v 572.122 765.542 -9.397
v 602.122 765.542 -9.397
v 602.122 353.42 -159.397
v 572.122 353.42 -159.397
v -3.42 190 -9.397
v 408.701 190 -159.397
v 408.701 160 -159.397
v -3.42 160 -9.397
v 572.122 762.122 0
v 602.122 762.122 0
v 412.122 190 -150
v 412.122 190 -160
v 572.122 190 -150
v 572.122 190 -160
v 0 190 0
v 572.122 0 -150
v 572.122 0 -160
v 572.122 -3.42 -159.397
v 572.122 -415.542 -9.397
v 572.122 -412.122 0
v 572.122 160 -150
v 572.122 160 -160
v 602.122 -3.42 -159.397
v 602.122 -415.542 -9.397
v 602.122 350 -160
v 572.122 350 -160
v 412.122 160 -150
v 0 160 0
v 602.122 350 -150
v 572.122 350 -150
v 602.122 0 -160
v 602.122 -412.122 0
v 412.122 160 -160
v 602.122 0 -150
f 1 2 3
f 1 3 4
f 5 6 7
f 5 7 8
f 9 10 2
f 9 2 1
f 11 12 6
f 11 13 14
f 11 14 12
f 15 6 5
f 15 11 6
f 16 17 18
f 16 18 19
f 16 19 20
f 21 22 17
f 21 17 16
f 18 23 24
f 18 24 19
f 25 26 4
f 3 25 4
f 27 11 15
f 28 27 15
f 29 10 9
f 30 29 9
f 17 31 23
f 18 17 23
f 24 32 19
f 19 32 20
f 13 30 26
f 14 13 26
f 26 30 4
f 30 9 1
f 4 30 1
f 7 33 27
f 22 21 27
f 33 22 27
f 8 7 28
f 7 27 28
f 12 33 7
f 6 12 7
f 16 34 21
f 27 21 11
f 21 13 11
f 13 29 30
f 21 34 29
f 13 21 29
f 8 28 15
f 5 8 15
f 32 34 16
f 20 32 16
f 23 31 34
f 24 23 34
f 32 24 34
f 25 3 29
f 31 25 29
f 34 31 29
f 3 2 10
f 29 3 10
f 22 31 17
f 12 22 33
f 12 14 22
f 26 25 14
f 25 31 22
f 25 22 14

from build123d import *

# Parameters (mm, degrees)
BOSS_EXTRUDE1_DEPTH  = 350
SKETCH2_W            = 150
SKETCH2_H            = 350
BOSS_EXTRUDE2_DEPTH  = 350
BOSS_EXTRUDE3_DEPTH  = 350
BOSS_EXTRUDE4_DEPTH  = 350
SKETCH6_W            = 438.570660024
SKETCH6_H            = 30
CUT_EXTRUDE1_DEPTH   = 10
CUT_EXTRUDE2_DEPTH   = 10
SKETCH8_W            = 30
SKETCH8_H            = 438.570660025
CUT_EXTRUDE3_DEPTH   = 10
SKETCH9_W            = 30
SKETCH9_H            = 438.570660025
CUT_EXTRUDE4_DEPTH   = 10
SKETCH12_W           = 438.570660024
SKETCH12_H           = 30
BOSS_EXTRUDE5_DEPTH  = 10
BOSS_EXTRUDE6_DEPTH  = 10
SKETCH14_W           = 30
SKETCH14_H           = 438.570660025
BOSS_EXTRUDE7_DEPTH  = 10
SKETCH15_W           = 30
SKETCH15_H           = 438.570660025
BOSS_EXTRUDE8_DEPTH  = 10
BOSS_EXTRUDE10_DEPTH = 30
BOSS_EXTRUDE11_DEPTH = 30
BOSS_EXTRUDE12_DEPTH = 30
SKETCH20_W           = 438.570660024
SKETCH20_H           = 160
CUT_EXTRUDE5_DEPTH   = 1000
SKETCH21_W           = 438.570660024
SKETCH21_H           = 160
CUT_EXTRUDE6_DEPTH   = 1000
SKETCH22_W           = 160
SKETCH22_H           = 160
CUT_EXTRUDE7_DEPTH   = 1000
SKETCH23_W           = 160
SKETCH23_H           = 160
CUT_EXTRUDE8_DEPTH   = 1000
SKETCH24_W           = 160
SKETCH24_H           = 438.570660025
CUT_EXTRUDE9_DEPTH   = 1000
SKETCH25_W           = 160
SKETCH25_H           = 438.570660025
CUT_EXTRUDE10_DEPTH  = 1000
SKETCH26_W           = 160
SKETCH26_H           = 350
CUT_EXTRUDE11_DEPTH  = 1000
SKETCH27_W           = 160
SKETCH27_H           = 438.570660025
CUT_EXTRUDE12_DEPTH  = 1000
SKETCH28_W           = 160
SKETCH28_H           = 438.570660025
CUT_EXTRUDE13_DEPTH  = 1000
CUT_EXTRUDE14_DEPTH  = 1000
CUT_EXTRUDE15_DEPTH  = 1000


with BuildPart() as part:
    # Sketch1 → Boss-Extrude1 (new body)
    with BuildSketch(Plane(origin=(0, 0, 0), x_dir=(1, 0, 0), z_dir=(0, 1, 0))):
        Polygon((0, 0), (412.121612918, 0), (412.121612918, 150), align=None)
    extrude(amount=BOSS_EXTRUDE1_DEPTH)

    # Sketch2 → Boss-Extrude2 (add)
    with BuildSketch(Plane(origin=(412.121612918, 0, 0), x_dir=(0, 0, -1), z_dir=(1, 0, 0))):
        with Locations((75, 175)):
            Rectangle(SKETCH2_W, SKETCH2_H)
    extrude(amount=BOSS_EXTRUDE2_DEPTH)

    # Sketch4 → Boss-Extrude3 (add)
    with BuildSketch(Plane(origin=(762.121612918, 0, 0), x_dir=(0, 0, -1), z_dir=(1, 0, 0))):
        Polygon((0, 762.121612918), (150, 350), (0, 350), align=None)
    extrude(amount=-BOSS_EXTRUDE3_DEPTH)

    # Sketch5 → Boss-Extrude4 (add)
    with BuildSketch(Plane(origin=(762.121612918, 0, 0), x_dir=(0, 0, -1), z_dir=(1, 0, 0))):
        Polygon((0, 0), (0, -412.121612918), (150, 0), align=None)
    extrude(amount=-BOSS_EXTRUDE4_DEPTH)

    # Sketch6 → Cut-Extrude1 (cut)
    with BuildSketch(Plane(origin=(0, 0, 0), x_dir=(-0.9396926207859104, 0, 0.34202014332566316), z_dir=(-0.34202014332566316, 0, -0.9396926207859104))):
        with Locations((-219.285330012, 175)):
            Rectangle(SKETCH6_W, SKETCH6_H)
    extrude(amount=-CUT_EXTRUDE1_DEPTH, mode=Mode.SUBTRACT)

    # Sketch7 → Cut-Extrude2 (cut)
    with BuildSketch(Plane(origin=(0, 0, -150), x_dir=(-1, 0, 0), z_dir=(0, 0, -1))):
        Polygon((-412.121612918, 190), (-572.121612918, 190), (-572.121612918, 350), (-602.121612918, 350), (-602.121612918, 190), (-602.121612918, 164.900861359), (-602.121612918, 160), (-602.121612918, 0), (-572.121612918, 0), (-572.121612918, 160), (-412.121612918, 160), align=None)
    extrude(amount=-CUT_EXTRUDE2_DEPTH, mode=Mode.SUBTRACT)

    # Sketch8 → Cut-Extrude3 (cut)
    with BuildSketch(Plane(origin=(0, -48.209070726, -132.453333234), x_dir=(-1, 0, 0), z_dir=(0, -0.34202014332566283, -0.9396926207859106))):
        with Locations((-587.121612918, -167.982308514)):
            Rectangle(SKETCH8_W, SKETCH8_H)
    extrude(amount=-CUT_EXTRUDE3_DEPTH, mode=Mode.SUBTRACT)

    # Sketch9 → Cut-Extrude4 (cut)
    with BuildSketch(Plane(origin=(0, 89.151293181, -244.941164929), x_dir=(-1, 0, 0), z_dir=(0, 0.342020143325663, -0.9396926207859105))):
        with Locations((-587.121612918, 496.874725788)):
            Rectangle(SKETCH9_W, SKETCH9_H)
    extrude(amount=-CUT_EXTRUDE4_DEPTH, mode=Mode.SUBTRACT)

    # Sketch20 → Cut-Extrude5 (cut)
    with BuildSketch(Plane(origin=(0, 0, 0), x_dir=(-0.9396926207859104, 0, 0.34202014332566316), z_dir=(-0.34202014332566316, 0, -0.9396926207859104))):
        with Locations((-219.285330012, 80)):
            Rectangle(SKETCH20_W, SKETCH20_H)
    extrude(amount=-CUT_EXTRUDE5_DEPTH, mode=Mode.SUBTRACT)

    # Sketch21 → Cut-Extrude6 (cut)
    with BuildSketch(Plane(origin=(0, 0, 0), x_dir=(-0.9396926207859104, 0, 0.34202014332566316), z_dir=(-0.34202014332566316, 0, -0.9396926207859104))):
        with Locations((-219.285330012, 270)):
            Rectangle(SKETCH21_W, SKETCH21_H)
    extrude(amount=-CUT_EXTRUDE6_DEPTH, mode=Mode.SUBTRACT)

    # Sketch22 → Cut-Extrude7 (cut)
    with BuildSketch(Plane(origin=(0, 0, -150), x_dir=(-1, 0, 0), z_dir=(0, 0, -1))):
        with Locations((-492.121612918, 270)):
            Rectangle(SKETCH22_W, SKETCH22_H)
    extrude(amount=-CUT_EXTRUDE7_DEPTH, mode=Mode.SUBTRACT)

    # Sketch23 → Cut-Extrude8 (cut)
    with BuildSketch(Plane(origin=(0, 0, -150), x_dir=(-1, 0, 0), z_dir=(0, 0, -1))):
        with Locations((-492.121612918, 80)):
            Rectangle(SKETCH23_W, SKETCH23_H)
    extrude(amount=-CUT_EXTRUDE8_DEPTH, mode=Mode.SUBTRACT)

    # Sketch24 → Cut-Extrude9 (cut)
    with BuildSketch(Plane(origin=(0, -48.209070726, -132.453333234), x_dir=(-1, 0, 0), z_dir=(0, -0.34202014332566283, -0.9396926207859106))):
        with Locations((-492.121612918, -167.982308514)):
            Rectangle(SKETCH24_W, SKETCH24_H)
    extrude(amount=-CUT_EXTRUDE9_DEPTH, mode=Mode.SUBTRACT)

    # Sketch25 → Cut-Extrude10 (cut)
    with BuildSketch(Plane(origin=(0, -48.209070726, -132.453333234), x_dir=(-1, 0, 0), z_dir=(0, -0.34202014332566283, -0.9396926207859106))):
        with Locations((-682.121612918, -167.982308514)):
            Rectangle(SKETCH25_W, SKETCH25_H)
    extrude(amount=-CUT_EXTRUDE10_DEPTH, mode=Mode.SUBTRACT)

    # Sketch26 → Cut-Extrude11 (cut)
    with BuildSketch(Plane(origin=(0, 0, -150), x_dir=(-1, 0, 0), z_dir=(0, 0, -1))):
        with Locations((-682.121612918, 175)):
            Rectangle(SKETCH26_W, SKETCH26_H)
    extrude(amount=-CUT_EXTRUDE11_DEPTH, mode=Mode.SUBTRACT)

    # Sketch27 → Cut-Extrude12 (cut)
    with BuildSketch(Plane(origin=(0, 89.151293181, -244.941164929), x_dir=(-1, 0, 0), z_dir=(0, 0.342020143325663, -0.9396926207859105))):
        with Locations((-682.121612918, 496.874725788)):
            Rectangle(SKETCH27_W, SKETCH27_H)
    extrude(amount=-CUT_EXTRUDE12_DEPTH, mode=Mode.SUBTRACT)

    # Sketch28 → Cut-Extrude13 (cut)
    with BuildSketch(Plane(origin=(0, 89.151293181, -244.941164929), x_dir=(-1, 0, 0), z_dir=(0, 0.342020143325663, -0.9396926207859105))):
        with Locations((-492.121612918, 496.874725788)):
            Rectangle(SKETCH28_W, SKETCH28_H)
    extrude(amount=-CUT_EXTRUDE13_DEPTH, mode=Mode.SUBTRACT)

    # Sketch29 → Cut-Extrude14 (cut)
    with BuildSketch(Plane.XZ.offset(-160)):
        Polygon((572.121612918, 0), (29.238044002, 0), (413.884882725, -140), (572.121612918, -140), align=None)
    extrude(amount=-CUT_EXTRUDE14_DEPTH, mode=Mode.SUBTRACT)

    # Sketch30 → Cut-Extrude15 (cut)
    with BuildSketch(Plane.ZY.offset(-572.121612918)):
        Polygon((-140, 348.236730193), (-140, 1.763269807), (0, -382.883568917), (0, 732.883568917), align=None)
    extrude(amount=-CUT_EXTRUDE15_DEPTH, mode=Mode.SUBTRACT)


with BuildPart() as body_2:
    # Sketch12 → Boss-Extrude5 (new body)
    with BuildSketch(Plane(origin=(0, 0, 0), x_dir=(-0.9396926207859104, 0, 0.34202014332566316), z_dir=(-0.34202014332566316, 0, -0.9396926207859104))):
        with Locations((-219.285330012, 175)):
            Rectangle(SKETCH12_W, SKETCH12_H)
    extrude(amount=BOSS_EXTRUDE5_DEPTH)



with BuildPart() as body_3:
    # Sketch13 → Boss-Extrude6 (new body)
    with BuildSketch(Plane(origin=(0, 0, -150), x_dir=(-1, 0, 0), z_dir=(0, 0, -1))):
        Polygon((-572.121612918, 0), (-572.121612918, 160), (-412.121612918, 160), (-412.121612918, 190), (-572.121612918, 190), (-572.121612918, 350), (-602.121612918, 350), (-602.121612918, 0), align=None)
    extrude(amount=BOSS_EXTRUDE6_DEPTH)



with BuildPart() as body_4:
    # Sketch14 → Boss-Extrude7 (new body)
    with BuildSketch(Plane(origin=(0, -48.209070726, -132.453333234), x_dir=(-1, 0, 0), z_dir=(0, -0.34202014332566283, -0.9396926207859106))):
        with Locations((-587.121612918, -167.982308514)):
            Rectangle(SKETCH14_W, SKETCH14_H)
    extrude(amount=BOSS_EXTRUDE7_DEPTH)



with BuildPart() as body_5:
    # Sketch15 → Boss-Extrude8 (new body)
    with BuildSketch(Plane(origin=(0, 89.151293181, -244.941164929), x_dir=(-1, 0, 0), z_dir=(0, 0.342020143325663, -0.9396926207859105))):
        with Locations((-587.121612918, 496.874725788)):
            Rectangle(SKETCH15_W, SKETCH15_H)
    extrude(amount=BOSS_EXTRUDE8_DEPTH)


with BuildPart() as body_3_1:
    add(body_3.part)

    add(body_5.part)  # Boss-Extrude10 merges body 5
    # Sketch17 → Boss-Extrude10 (add)
    with BuildSketch(Plane(origin=(602.121612918, 0, 0), x_dir=(0, 0, -1), z_dir=(1, 0, 0))):
        Polygon((160, 350), (159.396926208, 353.420201433), (150, 350), align=None)
    extrude(amount=-BOSS_EXTRUDE10_DEPTH)


with BuildPart() as body_4_1:
    add(body_4.part)

    add(body_3_1.part)  # Boss-Extrude11 merges body 3
    # Sketch18 → Boss-Extrude11 (add)
    with BuildSketch(Plane(origin=(602.121612918, 0, 0), x_dir=(0, 0, -1), z_dir=(1, 0, 0))):
        Polygon((159.396926208, -3.420201433), (150, 0), (160, 0), align=None)
    extrude(amount=-BOSS_EXTRUDE11_DEPTH)


with BuildPart() as body_2_1:
    add(body_2.part)

    add(body_4_1.part)  # Boss-Extrude12 merges body 4
    # Sketch19 → Boss-Extrude12 (add)
    with BuildSketch(Plane.XZ.offset(-160)):
        Polygon((408.701411485, -159.396926208), (412.121612918, -150), (412.121612918, -160), align=None)
    extrude(amount=-BOSS_EXTRUDE12_DEPTH)


solid = body_2_1.part
